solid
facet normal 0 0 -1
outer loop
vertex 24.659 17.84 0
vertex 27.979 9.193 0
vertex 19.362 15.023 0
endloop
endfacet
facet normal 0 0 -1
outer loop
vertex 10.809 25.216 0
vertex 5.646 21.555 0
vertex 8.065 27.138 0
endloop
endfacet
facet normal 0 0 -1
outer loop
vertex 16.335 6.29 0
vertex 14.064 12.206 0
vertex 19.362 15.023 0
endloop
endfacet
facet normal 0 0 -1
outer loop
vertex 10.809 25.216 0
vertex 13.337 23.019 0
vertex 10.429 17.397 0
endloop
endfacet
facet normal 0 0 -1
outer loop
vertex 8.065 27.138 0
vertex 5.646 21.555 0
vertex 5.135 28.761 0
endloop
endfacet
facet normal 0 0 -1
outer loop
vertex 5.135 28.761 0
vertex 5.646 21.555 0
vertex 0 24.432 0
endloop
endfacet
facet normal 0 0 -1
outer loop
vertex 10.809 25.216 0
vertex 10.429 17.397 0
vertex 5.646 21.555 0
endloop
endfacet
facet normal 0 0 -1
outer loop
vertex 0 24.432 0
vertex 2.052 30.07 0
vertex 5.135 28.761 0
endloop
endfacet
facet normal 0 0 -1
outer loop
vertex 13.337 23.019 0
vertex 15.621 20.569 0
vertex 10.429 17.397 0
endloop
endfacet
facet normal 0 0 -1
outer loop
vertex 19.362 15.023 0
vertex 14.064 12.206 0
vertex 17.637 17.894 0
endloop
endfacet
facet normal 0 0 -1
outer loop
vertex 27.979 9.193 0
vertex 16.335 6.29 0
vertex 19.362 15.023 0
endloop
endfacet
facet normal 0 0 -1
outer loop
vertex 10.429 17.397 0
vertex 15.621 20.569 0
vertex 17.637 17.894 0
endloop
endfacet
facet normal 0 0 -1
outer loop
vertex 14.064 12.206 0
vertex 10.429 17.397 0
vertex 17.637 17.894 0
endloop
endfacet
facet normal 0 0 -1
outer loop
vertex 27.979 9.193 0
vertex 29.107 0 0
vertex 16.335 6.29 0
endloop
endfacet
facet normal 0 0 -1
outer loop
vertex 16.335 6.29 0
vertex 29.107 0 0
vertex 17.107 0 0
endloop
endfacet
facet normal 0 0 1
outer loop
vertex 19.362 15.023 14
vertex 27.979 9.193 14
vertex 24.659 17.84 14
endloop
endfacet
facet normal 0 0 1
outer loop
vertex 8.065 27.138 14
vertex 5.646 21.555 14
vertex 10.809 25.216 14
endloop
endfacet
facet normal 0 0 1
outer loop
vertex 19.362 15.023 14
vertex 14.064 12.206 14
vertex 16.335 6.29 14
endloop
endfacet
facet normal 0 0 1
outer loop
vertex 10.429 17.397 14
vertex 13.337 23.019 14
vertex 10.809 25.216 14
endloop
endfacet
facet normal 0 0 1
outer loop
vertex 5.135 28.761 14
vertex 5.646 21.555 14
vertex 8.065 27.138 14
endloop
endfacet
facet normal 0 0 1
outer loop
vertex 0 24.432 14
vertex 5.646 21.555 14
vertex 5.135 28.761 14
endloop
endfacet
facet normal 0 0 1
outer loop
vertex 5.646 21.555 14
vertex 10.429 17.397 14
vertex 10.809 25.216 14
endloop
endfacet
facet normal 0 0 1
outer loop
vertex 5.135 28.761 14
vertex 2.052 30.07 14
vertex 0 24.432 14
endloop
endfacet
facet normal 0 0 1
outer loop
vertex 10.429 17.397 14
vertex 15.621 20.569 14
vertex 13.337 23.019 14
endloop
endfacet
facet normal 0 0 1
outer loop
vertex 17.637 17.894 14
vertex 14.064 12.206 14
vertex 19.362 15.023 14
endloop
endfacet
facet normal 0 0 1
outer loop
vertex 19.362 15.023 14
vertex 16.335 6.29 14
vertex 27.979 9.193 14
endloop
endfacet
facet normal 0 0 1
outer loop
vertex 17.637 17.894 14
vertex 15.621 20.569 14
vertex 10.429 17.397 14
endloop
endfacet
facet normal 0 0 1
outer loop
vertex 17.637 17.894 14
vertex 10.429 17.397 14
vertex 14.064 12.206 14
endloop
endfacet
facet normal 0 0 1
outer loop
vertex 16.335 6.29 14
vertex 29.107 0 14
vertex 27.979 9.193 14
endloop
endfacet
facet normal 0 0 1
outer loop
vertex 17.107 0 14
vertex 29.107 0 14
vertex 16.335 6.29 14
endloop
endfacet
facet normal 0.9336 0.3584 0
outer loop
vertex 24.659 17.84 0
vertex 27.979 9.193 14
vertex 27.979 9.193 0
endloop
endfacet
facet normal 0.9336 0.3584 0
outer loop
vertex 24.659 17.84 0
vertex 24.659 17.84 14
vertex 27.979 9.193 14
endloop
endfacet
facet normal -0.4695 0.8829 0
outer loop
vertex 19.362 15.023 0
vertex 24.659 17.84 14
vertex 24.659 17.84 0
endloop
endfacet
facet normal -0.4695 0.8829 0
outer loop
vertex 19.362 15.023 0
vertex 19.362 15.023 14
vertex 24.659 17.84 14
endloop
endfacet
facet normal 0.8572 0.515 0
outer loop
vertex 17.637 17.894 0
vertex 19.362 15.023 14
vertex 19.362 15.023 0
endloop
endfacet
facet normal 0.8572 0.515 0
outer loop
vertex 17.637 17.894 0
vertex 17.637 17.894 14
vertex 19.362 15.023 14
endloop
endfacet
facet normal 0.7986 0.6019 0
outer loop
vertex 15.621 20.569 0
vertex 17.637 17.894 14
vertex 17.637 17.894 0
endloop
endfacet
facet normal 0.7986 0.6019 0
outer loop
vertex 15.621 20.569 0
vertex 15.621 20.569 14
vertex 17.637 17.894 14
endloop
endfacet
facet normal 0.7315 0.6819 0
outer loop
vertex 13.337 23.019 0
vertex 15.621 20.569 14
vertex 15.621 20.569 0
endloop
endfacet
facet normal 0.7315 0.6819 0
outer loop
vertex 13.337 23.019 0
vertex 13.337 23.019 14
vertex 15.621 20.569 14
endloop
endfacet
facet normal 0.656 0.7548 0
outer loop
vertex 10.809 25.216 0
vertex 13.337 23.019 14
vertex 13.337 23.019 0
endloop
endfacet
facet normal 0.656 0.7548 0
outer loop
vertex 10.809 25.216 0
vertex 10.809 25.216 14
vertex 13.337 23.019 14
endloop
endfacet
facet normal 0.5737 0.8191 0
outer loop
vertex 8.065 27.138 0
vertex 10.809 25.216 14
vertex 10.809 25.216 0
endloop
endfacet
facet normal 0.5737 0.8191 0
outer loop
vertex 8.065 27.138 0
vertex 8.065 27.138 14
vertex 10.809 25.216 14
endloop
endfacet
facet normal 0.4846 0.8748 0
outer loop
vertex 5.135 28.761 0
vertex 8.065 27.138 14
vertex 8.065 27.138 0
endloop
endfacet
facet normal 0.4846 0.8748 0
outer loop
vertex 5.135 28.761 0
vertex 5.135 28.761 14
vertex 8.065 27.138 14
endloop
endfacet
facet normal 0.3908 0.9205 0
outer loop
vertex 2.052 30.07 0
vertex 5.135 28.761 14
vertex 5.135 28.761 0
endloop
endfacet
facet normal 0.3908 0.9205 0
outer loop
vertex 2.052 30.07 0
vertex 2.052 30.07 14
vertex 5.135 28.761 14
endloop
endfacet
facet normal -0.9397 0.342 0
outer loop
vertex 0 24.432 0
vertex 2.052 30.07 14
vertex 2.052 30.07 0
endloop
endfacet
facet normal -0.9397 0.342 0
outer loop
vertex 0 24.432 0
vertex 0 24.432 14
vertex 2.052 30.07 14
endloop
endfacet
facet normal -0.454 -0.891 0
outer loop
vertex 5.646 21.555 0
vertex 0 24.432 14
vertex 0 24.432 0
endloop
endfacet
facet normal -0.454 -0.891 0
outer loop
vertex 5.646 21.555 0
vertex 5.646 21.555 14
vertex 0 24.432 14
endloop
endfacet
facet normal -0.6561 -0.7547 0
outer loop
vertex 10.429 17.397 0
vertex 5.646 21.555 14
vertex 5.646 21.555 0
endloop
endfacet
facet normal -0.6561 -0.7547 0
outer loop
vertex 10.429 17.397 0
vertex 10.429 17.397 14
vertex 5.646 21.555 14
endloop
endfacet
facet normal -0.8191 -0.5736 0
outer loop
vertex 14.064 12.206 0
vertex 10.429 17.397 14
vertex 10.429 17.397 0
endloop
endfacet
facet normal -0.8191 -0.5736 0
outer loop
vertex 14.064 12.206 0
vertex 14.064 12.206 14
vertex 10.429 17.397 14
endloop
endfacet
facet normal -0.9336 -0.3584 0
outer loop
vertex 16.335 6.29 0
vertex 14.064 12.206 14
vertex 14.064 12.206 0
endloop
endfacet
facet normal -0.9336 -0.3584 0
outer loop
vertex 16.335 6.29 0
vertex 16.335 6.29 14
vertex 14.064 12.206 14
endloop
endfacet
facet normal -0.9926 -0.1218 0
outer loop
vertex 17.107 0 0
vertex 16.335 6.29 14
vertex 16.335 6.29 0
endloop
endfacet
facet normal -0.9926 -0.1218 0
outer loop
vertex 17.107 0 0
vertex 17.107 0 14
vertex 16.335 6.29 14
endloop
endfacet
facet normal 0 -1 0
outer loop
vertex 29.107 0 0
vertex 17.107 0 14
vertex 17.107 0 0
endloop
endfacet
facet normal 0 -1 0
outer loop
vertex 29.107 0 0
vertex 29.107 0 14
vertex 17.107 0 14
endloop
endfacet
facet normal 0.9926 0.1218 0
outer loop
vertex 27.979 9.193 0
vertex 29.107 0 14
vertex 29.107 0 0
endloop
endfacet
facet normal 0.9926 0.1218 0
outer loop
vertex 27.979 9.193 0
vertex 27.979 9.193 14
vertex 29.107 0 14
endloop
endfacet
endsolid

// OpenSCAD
$fn = 32;

// ----------------------------------------------------------------------
// Arc stop: segment, 14 mm thick
// ----------------------------------------------------------------------

// --- parameters (mm) ---
profile_height = 14;      // extrusion height
profile_points = 17;      // points of the closed outline

profile = [[29.107, 0], [27.979, 9.193], [24.659, 17.84], [19.362, 15.023], [17.637, 17.894], [15.621, 20.569], [13.337, 23.019], [10.809, 25.216], [8.065, 27.138], [5.135, 28.761], [2.052, 30.07], [0, 24.432], [5.646, 21.555], [10.429, 17.397], [14.064, 12.206], [16.335, 6.29], [17.107, 0]];  // single closed polygon, 17 points, counter clockwise

// --- the one profile operation ---
linear_extrude(height = profile_height) polygon(points = profile);
